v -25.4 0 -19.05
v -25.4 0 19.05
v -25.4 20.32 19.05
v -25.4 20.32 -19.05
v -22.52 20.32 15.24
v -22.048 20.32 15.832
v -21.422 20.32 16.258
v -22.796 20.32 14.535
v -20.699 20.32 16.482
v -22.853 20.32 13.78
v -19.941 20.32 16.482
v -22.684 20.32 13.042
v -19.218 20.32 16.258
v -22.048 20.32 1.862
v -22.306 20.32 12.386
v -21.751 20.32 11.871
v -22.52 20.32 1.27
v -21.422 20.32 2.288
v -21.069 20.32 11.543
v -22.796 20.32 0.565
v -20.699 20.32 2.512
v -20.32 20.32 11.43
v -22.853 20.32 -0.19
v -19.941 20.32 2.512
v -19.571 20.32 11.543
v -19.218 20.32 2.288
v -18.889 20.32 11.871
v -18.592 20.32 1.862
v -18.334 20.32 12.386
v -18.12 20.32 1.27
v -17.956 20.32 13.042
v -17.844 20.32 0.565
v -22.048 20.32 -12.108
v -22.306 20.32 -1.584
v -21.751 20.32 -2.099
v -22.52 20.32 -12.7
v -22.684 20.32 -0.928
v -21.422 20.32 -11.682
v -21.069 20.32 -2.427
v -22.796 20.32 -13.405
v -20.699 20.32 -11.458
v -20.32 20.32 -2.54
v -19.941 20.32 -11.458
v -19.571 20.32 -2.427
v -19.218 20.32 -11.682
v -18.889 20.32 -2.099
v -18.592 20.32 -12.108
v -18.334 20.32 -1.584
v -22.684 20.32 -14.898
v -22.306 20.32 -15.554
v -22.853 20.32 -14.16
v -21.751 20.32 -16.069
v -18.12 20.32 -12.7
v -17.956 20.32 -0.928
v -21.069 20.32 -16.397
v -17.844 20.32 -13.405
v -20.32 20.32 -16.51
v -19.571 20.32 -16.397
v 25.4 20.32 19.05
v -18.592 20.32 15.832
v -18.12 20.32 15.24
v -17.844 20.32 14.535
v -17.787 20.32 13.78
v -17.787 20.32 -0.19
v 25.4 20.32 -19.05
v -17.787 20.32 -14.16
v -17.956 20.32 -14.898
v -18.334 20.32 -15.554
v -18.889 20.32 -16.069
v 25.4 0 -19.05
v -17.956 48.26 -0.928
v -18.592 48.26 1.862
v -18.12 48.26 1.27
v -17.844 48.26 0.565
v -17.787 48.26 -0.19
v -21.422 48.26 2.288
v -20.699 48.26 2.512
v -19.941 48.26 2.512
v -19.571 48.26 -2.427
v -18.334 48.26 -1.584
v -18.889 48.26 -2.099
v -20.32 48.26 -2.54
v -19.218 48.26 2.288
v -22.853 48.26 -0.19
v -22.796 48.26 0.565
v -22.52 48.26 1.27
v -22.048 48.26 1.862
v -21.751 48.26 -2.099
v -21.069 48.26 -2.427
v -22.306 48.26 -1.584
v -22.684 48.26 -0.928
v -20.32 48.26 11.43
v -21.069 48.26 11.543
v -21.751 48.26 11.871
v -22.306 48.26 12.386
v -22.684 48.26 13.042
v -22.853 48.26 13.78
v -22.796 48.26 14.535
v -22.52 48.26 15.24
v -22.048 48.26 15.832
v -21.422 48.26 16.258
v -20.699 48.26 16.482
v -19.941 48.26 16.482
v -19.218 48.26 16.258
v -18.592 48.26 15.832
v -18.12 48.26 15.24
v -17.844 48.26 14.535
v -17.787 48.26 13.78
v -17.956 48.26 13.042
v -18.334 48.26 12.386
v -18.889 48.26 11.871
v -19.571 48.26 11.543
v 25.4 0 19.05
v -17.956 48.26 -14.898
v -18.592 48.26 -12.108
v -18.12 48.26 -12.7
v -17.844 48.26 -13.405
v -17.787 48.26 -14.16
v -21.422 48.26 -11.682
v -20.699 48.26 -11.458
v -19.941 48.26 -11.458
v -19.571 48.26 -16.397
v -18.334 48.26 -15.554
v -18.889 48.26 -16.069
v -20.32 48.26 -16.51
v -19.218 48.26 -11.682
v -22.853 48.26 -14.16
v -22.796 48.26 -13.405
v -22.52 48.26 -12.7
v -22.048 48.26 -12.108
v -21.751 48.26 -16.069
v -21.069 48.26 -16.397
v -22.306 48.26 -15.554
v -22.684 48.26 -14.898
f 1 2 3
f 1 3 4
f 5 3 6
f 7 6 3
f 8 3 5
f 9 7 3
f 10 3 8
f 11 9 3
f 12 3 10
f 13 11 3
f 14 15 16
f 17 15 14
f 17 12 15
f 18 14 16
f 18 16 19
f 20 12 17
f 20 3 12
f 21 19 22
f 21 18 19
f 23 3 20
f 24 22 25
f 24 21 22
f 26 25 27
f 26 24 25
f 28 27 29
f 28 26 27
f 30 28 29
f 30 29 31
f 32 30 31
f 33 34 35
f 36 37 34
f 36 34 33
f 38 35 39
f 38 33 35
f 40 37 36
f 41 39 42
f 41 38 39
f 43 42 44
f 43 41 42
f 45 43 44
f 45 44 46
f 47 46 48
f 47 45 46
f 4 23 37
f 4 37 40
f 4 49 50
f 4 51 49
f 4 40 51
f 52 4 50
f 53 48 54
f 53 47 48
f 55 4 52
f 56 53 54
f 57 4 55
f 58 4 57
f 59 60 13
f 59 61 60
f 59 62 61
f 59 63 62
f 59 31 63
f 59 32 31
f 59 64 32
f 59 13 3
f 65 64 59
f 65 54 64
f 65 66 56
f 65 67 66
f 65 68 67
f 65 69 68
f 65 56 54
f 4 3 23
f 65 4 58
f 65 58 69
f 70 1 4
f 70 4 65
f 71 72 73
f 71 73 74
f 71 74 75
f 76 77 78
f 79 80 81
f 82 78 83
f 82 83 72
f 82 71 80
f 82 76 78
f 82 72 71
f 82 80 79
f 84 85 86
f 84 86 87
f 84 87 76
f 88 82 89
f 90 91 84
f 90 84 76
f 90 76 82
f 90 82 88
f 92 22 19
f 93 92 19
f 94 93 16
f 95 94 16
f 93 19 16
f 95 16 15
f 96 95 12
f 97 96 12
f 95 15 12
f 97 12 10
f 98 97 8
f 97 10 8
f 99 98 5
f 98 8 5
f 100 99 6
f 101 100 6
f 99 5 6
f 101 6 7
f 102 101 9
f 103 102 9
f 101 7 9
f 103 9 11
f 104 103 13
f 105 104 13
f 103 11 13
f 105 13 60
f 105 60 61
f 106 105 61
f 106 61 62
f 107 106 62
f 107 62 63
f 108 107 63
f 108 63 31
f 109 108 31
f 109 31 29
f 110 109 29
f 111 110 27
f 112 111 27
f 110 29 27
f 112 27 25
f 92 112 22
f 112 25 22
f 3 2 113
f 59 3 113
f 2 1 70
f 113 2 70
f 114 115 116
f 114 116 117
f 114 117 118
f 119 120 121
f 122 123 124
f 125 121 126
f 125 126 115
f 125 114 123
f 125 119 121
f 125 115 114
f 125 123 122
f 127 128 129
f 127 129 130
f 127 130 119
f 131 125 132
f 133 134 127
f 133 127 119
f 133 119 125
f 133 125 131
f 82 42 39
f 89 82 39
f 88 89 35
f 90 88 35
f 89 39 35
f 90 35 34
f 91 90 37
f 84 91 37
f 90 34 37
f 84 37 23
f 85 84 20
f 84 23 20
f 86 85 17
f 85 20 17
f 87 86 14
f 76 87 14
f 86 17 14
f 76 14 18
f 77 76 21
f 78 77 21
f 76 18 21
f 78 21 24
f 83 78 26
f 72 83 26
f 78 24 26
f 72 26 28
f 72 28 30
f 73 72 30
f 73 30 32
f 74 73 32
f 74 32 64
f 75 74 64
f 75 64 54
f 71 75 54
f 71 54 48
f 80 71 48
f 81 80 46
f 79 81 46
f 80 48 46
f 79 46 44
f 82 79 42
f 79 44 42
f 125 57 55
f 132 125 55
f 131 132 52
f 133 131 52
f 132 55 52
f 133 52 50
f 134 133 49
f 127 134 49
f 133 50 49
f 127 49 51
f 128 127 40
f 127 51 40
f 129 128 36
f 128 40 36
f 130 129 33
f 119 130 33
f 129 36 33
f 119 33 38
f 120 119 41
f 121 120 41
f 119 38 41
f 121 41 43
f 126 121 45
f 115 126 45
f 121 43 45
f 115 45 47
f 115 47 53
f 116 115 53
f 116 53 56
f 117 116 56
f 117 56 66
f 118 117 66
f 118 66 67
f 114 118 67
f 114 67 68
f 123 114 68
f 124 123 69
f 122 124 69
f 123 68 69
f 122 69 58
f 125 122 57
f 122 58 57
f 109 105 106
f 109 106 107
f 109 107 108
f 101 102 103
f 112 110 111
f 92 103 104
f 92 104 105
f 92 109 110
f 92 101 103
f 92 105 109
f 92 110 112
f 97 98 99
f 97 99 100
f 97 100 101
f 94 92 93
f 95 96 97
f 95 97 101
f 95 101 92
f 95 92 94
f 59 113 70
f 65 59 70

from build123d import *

# Parameters (mm, degrees)
SKETCH1_W           = 50.8
SKETCH1_H           = 38.1
BOSS_EXTRUDE1_DEPTH = 20.32
SKETCH2_R           = 2.54
BOSS_EXTRUDE2_DEPTH = 27.94


with BuildPart() as part:
    # Sketch1 → Boss-Extrude1 (new body)
    with BuildSketch(Plane(origin=(0, 0, 0), x_dir=(1, 0, 0), z_dir=(0, 1, 0))):
        Rectangle(SKETCH1_W, SKETCH1_H)
    extrude(amount=BOSS_EXTRUDE1_DEPTH)

    # Sketch2 → Boss-Extrude2 (add)
    with BuildSketch(Plane(origin=(0, 20.32, 0), x_dir=(1, 0, 0), z_dir=(0, 1, 0))):
        with Locations(Location((-20.32, 13.97, 0), (0, 0, 90))):
            Circle(SKETCH2_R)
        with Locations(Location((-20.32, -13.97, 0), (0, 0, 90))):
            Circle(SKETCH2_R)
        with Locations(Location((-20.32, 0, 0), (0, 0, 90))):
            Circle(SKETCH2_R)
    extrude(amount=BOSS_EXTRUDE2_DEPTH)


solid = part.part
